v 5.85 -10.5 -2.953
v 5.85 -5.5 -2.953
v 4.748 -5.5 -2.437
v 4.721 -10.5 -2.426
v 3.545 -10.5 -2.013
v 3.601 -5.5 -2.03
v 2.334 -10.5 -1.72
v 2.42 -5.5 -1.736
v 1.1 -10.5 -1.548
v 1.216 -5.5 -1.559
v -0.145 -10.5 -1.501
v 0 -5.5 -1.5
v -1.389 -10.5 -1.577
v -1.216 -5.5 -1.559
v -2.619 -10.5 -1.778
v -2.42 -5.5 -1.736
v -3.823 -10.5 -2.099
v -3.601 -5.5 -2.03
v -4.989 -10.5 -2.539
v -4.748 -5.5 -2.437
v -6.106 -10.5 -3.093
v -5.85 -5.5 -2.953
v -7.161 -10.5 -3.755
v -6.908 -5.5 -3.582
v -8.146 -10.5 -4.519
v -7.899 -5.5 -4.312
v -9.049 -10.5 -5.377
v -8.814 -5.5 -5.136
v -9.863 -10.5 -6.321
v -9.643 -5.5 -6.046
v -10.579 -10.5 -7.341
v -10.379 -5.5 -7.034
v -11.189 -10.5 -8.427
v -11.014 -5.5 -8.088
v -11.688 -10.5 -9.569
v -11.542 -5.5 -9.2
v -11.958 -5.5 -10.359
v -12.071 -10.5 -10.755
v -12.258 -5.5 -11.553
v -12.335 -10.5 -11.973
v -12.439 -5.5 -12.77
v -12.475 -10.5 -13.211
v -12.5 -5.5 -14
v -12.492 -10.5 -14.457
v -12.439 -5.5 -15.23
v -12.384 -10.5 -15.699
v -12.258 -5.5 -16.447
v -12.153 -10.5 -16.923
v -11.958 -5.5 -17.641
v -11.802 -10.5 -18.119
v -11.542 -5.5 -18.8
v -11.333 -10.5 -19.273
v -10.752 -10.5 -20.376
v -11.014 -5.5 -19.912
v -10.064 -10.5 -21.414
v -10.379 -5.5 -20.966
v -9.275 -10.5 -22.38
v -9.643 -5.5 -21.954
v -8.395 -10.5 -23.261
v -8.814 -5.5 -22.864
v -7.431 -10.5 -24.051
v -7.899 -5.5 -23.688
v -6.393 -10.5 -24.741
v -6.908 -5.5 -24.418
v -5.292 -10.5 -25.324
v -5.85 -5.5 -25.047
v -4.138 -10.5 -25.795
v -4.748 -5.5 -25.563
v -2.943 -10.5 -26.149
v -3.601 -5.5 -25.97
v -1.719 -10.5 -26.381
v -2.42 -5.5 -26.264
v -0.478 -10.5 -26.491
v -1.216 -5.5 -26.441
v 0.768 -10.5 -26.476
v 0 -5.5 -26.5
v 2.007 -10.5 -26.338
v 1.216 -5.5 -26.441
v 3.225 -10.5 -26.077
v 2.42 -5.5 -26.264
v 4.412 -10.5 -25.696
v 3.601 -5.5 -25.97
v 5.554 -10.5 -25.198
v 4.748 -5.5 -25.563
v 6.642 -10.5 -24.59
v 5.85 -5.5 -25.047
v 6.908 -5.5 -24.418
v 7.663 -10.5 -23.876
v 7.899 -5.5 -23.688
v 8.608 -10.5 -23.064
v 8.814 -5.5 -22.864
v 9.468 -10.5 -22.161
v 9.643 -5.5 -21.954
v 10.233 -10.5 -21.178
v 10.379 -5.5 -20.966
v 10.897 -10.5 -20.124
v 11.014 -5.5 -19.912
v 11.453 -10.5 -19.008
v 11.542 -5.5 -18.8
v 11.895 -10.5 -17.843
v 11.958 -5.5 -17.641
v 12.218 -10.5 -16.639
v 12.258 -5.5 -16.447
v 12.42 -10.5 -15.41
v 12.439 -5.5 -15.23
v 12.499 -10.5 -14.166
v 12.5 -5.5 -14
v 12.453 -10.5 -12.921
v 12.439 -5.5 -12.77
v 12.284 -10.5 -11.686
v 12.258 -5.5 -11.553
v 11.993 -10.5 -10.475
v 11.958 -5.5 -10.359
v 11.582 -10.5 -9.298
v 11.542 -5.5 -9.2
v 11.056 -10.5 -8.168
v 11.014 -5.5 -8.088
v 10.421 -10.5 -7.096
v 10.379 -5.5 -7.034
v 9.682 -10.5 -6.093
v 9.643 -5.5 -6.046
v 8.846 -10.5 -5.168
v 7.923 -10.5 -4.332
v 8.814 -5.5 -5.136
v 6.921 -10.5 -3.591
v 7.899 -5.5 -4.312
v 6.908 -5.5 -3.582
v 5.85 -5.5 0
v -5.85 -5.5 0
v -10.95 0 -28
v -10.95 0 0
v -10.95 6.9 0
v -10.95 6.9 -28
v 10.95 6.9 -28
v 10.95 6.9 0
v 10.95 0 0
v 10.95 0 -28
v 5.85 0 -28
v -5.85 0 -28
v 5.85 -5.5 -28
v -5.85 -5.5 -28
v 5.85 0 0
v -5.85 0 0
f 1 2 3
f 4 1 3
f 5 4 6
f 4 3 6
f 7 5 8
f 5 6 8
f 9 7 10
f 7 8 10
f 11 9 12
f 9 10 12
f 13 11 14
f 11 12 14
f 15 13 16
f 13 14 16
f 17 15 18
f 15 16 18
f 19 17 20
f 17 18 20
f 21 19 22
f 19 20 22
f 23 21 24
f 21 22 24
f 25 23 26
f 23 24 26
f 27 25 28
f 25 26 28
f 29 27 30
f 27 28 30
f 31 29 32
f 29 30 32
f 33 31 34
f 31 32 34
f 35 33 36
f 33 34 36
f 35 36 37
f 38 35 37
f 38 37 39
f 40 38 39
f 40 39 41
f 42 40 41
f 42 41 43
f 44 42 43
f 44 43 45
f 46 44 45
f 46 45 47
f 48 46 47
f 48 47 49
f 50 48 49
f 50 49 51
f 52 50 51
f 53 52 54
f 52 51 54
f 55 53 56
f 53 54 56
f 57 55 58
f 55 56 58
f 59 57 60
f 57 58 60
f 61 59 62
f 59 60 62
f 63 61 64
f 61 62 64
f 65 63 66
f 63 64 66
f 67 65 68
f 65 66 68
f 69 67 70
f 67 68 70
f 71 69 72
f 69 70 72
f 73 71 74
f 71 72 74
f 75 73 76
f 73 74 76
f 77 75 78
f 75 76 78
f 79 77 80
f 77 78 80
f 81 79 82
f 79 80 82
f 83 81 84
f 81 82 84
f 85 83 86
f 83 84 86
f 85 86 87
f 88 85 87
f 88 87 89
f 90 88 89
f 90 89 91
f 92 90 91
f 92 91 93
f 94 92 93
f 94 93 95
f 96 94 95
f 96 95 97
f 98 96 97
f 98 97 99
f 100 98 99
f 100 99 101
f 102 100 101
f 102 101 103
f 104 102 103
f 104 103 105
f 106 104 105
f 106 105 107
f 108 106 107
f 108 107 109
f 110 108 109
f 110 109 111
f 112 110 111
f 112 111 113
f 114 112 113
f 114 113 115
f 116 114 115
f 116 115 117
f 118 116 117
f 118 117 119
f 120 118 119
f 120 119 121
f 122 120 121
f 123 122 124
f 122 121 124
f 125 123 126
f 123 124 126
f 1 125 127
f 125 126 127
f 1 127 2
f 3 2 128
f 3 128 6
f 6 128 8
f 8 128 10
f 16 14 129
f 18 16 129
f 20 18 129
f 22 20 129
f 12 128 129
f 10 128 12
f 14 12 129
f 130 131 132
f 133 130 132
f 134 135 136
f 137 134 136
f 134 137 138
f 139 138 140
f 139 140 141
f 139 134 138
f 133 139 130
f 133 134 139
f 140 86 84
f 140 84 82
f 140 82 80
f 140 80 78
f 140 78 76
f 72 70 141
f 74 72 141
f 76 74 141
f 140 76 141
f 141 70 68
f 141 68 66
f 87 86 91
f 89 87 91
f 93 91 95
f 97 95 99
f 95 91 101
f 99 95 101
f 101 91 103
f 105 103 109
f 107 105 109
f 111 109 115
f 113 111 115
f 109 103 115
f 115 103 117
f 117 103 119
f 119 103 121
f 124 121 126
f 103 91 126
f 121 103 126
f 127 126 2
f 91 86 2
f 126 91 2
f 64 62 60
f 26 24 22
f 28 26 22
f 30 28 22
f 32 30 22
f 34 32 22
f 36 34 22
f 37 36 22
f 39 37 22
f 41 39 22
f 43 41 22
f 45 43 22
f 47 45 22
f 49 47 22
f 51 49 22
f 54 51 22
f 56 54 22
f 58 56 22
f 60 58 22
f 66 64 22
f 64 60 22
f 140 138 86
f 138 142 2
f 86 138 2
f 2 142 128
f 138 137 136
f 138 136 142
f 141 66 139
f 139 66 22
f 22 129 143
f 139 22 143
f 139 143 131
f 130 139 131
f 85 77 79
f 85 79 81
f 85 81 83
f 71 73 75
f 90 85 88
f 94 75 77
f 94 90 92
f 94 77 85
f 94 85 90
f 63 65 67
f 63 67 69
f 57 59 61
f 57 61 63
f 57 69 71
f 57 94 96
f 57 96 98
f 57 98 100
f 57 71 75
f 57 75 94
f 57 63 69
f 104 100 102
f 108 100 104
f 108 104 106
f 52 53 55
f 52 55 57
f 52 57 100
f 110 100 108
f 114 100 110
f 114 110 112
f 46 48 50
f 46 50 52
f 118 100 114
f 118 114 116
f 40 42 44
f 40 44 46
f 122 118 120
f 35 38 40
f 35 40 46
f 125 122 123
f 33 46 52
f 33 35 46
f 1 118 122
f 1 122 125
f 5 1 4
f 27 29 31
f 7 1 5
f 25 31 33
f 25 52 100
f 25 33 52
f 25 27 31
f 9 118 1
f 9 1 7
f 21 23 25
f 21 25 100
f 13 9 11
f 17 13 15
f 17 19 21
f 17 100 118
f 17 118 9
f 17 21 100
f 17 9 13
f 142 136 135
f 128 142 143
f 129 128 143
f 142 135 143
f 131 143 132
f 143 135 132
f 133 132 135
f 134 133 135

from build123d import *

# Parameters (mm, degrees)
BOSS_EXTRUDE1_DEPTH = 28
SKETCH3_R           = 12.5
BOSS_EXTRUDE2_DEPTH = 5


with BuildPart() as part:
    # Sketch1 → Boss-Extrude1 (new body)
    with BuildSketch(Plane.XY):
        Polygon((5.85, 0), (5.85, -5.5), (-5.85, -5.5), (-5.85, 0), (-10.95, 0), (-10.95, 6.9), (10.95, 6.9), (10.95, 0), align=None)
    extrude(amount=-BOSS_EXTRUDE1_DEPTH)

    # Sketch3 → Boss-Extrude2 (add)
    with BuildSketch(Plane.XZ.offset(5.5)):
        with Locations(Location((0, -14, 0), (0, 0, 62.095449663))):
            Circle(SKETCH3_R)
    extrude(amount=BOSS_EXTRUDE2_DEPTH)


solid = part.part
